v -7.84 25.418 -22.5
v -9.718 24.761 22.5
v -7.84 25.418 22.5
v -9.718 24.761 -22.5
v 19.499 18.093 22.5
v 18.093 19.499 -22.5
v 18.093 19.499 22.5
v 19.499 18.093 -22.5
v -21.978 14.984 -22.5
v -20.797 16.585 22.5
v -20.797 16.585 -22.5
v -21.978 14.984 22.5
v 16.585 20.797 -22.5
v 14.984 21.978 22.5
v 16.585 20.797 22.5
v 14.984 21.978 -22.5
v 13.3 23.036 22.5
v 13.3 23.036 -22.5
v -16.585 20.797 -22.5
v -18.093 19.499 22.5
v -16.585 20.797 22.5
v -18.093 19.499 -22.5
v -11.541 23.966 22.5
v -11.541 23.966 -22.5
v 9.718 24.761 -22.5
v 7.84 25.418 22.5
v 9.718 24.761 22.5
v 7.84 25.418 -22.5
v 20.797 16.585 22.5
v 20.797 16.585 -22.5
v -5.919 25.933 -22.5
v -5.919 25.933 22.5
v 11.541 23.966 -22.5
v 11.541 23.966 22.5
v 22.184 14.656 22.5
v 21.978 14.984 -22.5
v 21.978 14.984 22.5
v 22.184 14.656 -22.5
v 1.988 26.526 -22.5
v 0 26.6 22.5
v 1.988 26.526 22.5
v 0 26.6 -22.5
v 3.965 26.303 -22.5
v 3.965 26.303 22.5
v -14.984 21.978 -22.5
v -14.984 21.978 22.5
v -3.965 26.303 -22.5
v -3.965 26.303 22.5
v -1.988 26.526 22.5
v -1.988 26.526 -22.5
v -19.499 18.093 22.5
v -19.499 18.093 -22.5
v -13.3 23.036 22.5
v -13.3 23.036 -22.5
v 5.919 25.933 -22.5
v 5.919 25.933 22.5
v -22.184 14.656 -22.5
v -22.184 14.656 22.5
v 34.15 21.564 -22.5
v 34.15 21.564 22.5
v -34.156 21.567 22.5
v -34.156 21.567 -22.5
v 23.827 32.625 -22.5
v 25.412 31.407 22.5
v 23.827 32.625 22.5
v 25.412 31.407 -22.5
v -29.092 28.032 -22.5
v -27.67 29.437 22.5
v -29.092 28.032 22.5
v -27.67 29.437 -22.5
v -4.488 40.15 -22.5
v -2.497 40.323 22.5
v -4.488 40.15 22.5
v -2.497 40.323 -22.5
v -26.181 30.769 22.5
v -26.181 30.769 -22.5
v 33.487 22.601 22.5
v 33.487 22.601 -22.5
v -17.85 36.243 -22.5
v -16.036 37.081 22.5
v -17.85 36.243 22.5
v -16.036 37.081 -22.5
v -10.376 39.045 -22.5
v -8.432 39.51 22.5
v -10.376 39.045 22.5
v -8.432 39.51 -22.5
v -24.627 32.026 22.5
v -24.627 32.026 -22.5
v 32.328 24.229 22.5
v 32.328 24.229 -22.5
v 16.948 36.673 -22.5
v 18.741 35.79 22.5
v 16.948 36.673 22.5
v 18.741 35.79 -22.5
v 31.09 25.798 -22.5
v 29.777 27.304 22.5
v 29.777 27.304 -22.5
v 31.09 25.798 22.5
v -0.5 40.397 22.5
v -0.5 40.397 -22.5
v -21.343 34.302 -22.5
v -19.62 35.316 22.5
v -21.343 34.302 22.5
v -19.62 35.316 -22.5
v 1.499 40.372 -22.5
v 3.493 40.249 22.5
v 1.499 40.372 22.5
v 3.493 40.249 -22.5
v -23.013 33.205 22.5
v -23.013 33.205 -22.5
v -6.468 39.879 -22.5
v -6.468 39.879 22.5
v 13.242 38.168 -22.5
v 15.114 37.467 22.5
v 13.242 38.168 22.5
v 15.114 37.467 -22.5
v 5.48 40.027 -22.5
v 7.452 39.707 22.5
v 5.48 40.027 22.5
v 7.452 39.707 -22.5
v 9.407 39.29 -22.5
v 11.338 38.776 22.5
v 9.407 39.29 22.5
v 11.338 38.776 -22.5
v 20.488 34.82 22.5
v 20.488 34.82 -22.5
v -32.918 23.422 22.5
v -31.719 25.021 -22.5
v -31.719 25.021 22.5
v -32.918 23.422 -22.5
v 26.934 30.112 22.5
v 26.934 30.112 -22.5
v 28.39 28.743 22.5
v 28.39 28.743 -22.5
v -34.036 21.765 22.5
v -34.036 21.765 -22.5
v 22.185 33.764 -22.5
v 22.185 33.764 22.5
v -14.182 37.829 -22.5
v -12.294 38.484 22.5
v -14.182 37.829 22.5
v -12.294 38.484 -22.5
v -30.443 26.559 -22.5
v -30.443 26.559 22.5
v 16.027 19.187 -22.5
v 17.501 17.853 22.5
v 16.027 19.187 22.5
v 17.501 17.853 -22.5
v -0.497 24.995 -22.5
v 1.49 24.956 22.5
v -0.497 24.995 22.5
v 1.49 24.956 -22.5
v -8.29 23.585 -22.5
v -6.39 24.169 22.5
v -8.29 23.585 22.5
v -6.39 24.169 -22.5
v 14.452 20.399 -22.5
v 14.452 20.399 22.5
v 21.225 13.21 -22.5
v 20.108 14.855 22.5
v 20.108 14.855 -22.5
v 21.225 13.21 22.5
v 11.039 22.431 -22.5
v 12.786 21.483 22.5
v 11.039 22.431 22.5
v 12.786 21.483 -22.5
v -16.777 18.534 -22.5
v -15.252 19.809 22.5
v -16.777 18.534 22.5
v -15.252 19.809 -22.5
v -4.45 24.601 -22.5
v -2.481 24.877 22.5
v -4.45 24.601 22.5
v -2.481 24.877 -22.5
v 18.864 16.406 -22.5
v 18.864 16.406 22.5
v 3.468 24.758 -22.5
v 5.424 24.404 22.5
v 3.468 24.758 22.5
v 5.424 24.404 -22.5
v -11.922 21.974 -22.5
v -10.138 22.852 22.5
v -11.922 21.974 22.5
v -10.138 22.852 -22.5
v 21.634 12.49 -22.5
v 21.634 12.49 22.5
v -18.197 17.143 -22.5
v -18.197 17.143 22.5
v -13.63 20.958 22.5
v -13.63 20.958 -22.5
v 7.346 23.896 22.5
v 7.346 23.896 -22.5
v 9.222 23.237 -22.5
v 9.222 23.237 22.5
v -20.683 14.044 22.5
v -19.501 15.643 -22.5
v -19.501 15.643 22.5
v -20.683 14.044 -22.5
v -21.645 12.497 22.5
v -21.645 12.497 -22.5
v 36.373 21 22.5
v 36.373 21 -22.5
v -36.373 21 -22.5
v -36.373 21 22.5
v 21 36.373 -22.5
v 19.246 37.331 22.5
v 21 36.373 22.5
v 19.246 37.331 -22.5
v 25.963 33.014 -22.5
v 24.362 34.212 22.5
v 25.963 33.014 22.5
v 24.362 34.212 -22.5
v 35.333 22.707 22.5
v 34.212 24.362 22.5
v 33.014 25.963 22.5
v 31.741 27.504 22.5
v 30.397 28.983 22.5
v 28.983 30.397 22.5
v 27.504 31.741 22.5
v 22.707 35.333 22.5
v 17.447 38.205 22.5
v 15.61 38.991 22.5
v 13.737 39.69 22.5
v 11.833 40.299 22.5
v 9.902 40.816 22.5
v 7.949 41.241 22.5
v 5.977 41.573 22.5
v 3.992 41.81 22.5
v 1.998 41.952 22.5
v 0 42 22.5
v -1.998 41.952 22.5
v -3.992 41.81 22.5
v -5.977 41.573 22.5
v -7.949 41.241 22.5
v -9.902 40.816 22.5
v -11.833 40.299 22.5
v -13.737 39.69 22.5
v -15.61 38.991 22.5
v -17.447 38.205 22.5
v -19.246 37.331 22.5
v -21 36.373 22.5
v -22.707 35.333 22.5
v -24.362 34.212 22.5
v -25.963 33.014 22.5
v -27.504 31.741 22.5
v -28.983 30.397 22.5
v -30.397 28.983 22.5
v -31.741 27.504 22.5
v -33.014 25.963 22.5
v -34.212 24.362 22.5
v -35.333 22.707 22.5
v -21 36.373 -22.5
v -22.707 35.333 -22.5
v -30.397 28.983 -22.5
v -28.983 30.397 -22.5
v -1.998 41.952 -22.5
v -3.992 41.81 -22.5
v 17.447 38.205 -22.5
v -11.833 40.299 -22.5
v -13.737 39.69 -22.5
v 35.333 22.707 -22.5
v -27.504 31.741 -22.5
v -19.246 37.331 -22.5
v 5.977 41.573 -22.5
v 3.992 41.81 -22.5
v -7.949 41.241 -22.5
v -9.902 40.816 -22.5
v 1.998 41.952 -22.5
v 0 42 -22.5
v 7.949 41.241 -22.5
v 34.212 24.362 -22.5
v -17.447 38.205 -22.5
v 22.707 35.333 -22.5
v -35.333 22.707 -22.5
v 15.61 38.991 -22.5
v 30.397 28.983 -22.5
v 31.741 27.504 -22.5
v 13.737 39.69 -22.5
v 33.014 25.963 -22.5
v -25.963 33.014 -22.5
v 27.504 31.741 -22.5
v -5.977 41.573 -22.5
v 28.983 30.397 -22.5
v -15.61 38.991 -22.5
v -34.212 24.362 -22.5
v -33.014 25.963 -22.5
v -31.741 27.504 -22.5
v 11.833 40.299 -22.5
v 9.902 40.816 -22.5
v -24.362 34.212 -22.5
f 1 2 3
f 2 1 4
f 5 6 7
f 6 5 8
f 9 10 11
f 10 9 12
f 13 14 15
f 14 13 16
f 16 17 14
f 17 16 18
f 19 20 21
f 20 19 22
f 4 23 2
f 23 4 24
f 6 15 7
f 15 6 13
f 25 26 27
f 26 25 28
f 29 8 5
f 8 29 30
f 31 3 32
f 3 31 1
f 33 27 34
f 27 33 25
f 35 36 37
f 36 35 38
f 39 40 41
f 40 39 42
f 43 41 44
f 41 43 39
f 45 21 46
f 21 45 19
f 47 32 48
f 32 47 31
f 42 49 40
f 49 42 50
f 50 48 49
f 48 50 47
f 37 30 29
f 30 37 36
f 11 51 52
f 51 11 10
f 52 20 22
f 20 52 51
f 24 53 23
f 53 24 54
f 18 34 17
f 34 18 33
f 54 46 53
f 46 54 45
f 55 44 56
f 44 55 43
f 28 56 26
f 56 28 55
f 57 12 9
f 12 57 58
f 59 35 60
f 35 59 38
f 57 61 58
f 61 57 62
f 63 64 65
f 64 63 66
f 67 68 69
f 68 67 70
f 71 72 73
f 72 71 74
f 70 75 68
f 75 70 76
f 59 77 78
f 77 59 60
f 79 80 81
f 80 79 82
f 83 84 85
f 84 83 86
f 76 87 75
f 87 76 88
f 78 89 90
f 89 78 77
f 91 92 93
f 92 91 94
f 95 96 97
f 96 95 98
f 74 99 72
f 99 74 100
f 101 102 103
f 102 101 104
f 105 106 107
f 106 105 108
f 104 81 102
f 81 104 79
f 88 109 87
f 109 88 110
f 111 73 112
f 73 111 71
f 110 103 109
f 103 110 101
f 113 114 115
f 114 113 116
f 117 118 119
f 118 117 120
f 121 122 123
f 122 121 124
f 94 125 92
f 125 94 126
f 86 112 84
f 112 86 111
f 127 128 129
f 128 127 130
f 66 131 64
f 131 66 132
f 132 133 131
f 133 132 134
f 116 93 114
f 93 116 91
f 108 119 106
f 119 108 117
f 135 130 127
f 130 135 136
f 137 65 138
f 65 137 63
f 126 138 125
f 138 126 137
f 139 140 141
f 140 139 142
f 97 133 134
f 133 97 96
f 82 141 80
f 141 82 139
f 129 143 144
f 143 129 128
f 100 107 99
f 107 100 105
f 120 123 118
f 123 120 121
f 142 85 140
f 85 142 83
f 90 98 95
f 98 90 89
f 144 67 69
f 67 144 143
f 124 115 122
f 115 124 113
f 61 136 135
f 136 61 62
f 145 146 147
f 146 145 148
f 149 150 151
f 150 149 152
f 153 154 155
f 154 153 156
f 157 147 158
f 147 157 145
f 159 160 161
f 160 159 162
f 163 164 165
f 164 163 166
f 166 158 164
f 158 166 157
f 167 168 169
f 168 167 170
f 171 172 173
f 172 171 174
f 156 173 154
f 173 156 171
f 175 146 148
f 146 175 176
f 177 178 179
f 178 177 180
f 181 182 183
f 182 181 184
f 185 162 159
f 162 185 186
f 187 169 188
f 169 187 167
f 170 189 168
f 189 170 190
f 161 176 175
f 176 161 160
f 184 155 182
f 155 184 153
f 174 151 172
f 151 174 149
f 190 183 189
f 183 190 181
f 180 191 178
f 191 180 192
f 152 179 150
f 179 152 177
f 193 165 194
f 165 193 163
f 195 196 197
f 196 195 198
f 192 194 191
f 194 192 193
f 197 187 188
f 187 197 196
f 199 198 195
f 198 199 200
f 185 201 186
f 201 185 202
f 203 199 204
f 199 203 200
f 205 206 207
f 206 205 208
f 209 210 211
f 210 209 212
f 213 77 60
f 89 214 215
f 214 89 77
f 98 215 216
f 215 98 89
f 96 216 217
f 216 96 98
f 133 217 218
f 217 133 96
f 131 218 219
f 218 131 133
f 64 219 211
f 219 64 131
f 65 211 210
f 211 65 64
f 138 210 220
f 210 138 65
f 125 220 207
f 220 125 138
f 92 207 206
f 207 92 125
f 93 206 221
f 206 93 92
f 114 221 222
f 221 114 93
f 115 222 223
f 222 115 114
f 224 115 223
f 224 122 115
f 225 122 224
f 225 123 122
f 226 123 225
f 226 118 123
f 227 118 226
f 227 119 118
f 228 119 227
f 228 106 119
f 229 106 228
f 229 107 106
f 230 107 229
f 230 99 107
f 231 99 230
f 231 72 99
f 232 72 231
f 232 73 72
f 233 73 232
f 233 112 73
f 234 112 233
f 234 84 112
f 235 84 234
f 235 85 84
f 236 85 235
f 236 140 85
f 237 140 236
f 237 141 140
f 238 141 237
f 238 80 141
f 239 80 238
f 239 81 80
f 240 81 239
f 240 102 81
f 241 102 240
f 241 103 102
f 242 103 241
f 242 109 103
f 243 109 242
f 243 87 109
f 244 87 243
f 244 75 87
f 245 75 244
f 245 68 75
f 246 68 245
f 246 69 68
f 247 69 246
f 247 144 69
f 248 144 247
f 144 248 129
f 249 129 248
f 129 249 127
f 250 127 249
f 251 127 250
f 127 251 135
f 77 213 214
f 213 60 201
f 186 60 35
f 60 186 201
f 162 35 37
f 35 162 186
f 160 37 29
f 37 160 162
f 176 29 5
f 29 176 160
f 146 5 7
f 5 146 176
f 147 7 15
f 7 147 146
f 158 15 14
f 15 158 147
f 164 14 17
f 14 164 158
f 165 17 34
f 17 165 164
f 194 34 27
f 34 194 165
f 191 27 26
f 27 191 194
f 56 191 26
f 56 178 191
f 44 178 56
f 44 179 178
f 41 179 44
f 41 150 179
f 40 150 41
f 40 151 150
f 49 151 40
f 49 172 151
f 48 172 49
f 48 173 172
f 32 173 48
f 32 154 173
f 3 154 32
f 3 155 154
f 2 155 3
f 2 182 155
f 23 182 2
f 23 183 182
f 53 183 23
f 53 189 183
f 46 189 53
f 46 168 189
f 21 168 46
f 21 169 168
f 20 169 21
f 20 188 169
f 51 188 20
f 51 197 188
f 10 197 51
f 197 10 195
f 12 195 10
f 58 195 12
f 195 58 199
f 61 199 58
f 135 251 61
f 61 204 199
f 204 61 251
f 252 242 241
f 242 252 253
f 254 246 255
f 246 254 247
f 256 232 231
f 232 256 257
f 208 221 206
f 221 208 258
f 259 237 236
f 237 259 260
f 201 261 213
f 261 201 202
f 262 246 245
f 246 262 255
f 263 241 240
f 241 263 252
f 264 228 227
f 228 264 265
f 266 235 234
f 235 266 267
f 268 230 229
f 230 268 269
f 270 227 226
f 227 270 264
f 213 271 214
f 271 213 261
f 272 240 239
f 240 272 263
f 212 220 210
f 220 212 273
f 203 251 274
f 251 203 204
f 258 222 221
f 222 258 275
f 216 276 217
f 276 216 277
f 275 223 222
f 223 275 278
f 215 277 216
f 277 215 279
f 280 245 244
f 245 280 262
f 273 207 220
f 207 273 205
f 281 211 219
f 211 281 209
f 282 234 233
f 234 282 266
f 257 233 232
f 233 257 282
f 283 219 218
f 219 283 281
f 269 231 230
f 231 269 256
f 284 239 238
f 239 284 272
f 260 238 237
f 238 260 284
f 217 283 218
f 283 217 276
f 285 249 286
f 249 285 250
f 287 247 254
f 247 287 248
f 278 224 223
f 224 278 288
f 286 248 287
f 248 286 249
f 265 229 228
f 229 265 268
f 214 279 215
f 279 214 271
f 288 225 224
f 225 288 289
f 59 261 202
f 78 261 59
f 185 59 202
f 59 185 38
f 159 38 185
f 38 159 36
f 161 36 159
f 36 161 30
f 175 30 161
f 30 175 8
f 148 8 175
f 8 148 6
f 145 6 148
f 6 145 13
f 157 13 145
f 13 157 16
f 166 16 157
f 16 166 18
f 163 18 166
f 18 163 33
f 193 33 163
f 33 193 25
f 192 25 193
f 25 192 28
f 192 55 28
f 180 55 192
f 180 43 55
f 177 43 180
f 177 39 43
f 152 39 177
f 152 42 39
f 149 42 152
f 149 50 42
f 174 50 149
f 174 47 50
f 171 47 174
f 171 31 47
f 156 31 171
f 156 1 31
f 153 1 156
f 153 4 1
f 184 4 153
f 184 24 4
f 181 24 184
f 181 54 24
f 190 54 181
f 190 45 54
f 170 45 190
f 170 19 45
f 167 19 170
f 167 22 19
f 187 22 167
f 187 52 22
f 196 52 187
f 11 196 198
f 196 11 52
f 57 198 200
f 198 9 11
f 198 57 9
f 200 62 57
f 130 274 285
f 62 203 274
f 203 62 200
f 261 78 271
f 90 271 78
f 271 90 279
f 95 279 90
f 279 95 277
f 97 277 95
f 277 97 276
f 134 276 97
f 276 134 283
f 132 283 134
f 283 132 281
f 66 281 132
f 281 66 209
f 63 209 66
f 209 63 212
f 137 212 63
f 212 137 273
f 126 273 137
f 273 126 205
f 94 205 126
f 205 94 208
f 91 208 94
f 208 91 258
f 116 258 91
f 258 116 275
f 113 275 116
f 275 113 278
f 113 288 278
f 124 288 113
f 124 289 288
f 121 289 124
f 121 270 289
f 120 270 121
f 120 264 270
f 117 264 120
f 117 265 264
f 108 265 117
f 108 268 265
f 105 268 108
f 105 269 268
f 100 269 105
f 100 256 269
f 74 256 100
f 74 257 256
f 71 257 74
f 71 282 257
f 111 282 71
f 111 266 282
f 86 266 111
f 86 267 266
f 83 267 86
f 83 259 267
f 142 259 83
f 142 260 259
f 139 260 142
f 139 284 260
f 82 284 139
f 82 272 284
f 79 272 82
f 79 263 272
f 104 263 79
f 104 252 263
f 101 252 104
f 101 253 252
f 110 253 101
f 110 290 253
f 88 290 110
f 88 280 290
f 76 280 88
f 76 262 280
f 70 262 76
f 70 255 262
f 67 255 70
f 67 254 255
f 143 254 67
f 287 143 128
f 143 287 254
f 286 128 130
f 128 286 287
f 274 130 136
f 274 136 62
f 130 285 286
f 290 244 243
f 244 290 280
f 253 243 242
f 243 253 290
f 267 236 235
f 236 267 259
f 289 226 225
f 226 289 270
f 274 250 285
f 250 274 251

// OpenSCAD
// Input variables
seg_thk=45;     // Width of spool between flanges
inner_rad=25;   // Radius of spool hub
width=17;       // Required width of segment
arc=120;        // segment length in degrees

// Calculated variables
outer_rad=inner_rad+width;  // New spool hub radius
wall=1.6;
clear_thk=seg_thk+2;
ang=(180-arc)/2;

// Overall definition
$fa=1;

// Cut away half of a cylinder
module CutHalf(y_off,extra_thk)
{
translate([0,-1*y_off,0])
    cube([outer_rad*2,inner_rad*2,seg_thk+extra_thk],true);
}

{
difference()
    {
    cylinder(seg_thk,r=outer_rad,center=true);   // New hub 

    union()
        {
        cylinder(seg_thk+2,r=inner_rad,center=true);    // Loose existing hub
        rotate([0,0,ang]) CutHalf(inner_rad,2);     // Loose one side
        rotate([0,0,-ang]) CutHalf(inner_rad,2);    // And the other
        difference()    // Now hollow out the segment
            {
            cylinder(seg_thk+2,r=outer_rad-wall,center=true);
                
            union()
                {
                cylinder(seg_thk+4,r=inner_rad+wall,center=true);
                rotate([0,0,ang]) CutHalf(inner_rad-wall,4);
                rotate([0,0,-1*ang]) CutHalf(inner_rad-wall,4);
                }
            }
        }
    }

}
